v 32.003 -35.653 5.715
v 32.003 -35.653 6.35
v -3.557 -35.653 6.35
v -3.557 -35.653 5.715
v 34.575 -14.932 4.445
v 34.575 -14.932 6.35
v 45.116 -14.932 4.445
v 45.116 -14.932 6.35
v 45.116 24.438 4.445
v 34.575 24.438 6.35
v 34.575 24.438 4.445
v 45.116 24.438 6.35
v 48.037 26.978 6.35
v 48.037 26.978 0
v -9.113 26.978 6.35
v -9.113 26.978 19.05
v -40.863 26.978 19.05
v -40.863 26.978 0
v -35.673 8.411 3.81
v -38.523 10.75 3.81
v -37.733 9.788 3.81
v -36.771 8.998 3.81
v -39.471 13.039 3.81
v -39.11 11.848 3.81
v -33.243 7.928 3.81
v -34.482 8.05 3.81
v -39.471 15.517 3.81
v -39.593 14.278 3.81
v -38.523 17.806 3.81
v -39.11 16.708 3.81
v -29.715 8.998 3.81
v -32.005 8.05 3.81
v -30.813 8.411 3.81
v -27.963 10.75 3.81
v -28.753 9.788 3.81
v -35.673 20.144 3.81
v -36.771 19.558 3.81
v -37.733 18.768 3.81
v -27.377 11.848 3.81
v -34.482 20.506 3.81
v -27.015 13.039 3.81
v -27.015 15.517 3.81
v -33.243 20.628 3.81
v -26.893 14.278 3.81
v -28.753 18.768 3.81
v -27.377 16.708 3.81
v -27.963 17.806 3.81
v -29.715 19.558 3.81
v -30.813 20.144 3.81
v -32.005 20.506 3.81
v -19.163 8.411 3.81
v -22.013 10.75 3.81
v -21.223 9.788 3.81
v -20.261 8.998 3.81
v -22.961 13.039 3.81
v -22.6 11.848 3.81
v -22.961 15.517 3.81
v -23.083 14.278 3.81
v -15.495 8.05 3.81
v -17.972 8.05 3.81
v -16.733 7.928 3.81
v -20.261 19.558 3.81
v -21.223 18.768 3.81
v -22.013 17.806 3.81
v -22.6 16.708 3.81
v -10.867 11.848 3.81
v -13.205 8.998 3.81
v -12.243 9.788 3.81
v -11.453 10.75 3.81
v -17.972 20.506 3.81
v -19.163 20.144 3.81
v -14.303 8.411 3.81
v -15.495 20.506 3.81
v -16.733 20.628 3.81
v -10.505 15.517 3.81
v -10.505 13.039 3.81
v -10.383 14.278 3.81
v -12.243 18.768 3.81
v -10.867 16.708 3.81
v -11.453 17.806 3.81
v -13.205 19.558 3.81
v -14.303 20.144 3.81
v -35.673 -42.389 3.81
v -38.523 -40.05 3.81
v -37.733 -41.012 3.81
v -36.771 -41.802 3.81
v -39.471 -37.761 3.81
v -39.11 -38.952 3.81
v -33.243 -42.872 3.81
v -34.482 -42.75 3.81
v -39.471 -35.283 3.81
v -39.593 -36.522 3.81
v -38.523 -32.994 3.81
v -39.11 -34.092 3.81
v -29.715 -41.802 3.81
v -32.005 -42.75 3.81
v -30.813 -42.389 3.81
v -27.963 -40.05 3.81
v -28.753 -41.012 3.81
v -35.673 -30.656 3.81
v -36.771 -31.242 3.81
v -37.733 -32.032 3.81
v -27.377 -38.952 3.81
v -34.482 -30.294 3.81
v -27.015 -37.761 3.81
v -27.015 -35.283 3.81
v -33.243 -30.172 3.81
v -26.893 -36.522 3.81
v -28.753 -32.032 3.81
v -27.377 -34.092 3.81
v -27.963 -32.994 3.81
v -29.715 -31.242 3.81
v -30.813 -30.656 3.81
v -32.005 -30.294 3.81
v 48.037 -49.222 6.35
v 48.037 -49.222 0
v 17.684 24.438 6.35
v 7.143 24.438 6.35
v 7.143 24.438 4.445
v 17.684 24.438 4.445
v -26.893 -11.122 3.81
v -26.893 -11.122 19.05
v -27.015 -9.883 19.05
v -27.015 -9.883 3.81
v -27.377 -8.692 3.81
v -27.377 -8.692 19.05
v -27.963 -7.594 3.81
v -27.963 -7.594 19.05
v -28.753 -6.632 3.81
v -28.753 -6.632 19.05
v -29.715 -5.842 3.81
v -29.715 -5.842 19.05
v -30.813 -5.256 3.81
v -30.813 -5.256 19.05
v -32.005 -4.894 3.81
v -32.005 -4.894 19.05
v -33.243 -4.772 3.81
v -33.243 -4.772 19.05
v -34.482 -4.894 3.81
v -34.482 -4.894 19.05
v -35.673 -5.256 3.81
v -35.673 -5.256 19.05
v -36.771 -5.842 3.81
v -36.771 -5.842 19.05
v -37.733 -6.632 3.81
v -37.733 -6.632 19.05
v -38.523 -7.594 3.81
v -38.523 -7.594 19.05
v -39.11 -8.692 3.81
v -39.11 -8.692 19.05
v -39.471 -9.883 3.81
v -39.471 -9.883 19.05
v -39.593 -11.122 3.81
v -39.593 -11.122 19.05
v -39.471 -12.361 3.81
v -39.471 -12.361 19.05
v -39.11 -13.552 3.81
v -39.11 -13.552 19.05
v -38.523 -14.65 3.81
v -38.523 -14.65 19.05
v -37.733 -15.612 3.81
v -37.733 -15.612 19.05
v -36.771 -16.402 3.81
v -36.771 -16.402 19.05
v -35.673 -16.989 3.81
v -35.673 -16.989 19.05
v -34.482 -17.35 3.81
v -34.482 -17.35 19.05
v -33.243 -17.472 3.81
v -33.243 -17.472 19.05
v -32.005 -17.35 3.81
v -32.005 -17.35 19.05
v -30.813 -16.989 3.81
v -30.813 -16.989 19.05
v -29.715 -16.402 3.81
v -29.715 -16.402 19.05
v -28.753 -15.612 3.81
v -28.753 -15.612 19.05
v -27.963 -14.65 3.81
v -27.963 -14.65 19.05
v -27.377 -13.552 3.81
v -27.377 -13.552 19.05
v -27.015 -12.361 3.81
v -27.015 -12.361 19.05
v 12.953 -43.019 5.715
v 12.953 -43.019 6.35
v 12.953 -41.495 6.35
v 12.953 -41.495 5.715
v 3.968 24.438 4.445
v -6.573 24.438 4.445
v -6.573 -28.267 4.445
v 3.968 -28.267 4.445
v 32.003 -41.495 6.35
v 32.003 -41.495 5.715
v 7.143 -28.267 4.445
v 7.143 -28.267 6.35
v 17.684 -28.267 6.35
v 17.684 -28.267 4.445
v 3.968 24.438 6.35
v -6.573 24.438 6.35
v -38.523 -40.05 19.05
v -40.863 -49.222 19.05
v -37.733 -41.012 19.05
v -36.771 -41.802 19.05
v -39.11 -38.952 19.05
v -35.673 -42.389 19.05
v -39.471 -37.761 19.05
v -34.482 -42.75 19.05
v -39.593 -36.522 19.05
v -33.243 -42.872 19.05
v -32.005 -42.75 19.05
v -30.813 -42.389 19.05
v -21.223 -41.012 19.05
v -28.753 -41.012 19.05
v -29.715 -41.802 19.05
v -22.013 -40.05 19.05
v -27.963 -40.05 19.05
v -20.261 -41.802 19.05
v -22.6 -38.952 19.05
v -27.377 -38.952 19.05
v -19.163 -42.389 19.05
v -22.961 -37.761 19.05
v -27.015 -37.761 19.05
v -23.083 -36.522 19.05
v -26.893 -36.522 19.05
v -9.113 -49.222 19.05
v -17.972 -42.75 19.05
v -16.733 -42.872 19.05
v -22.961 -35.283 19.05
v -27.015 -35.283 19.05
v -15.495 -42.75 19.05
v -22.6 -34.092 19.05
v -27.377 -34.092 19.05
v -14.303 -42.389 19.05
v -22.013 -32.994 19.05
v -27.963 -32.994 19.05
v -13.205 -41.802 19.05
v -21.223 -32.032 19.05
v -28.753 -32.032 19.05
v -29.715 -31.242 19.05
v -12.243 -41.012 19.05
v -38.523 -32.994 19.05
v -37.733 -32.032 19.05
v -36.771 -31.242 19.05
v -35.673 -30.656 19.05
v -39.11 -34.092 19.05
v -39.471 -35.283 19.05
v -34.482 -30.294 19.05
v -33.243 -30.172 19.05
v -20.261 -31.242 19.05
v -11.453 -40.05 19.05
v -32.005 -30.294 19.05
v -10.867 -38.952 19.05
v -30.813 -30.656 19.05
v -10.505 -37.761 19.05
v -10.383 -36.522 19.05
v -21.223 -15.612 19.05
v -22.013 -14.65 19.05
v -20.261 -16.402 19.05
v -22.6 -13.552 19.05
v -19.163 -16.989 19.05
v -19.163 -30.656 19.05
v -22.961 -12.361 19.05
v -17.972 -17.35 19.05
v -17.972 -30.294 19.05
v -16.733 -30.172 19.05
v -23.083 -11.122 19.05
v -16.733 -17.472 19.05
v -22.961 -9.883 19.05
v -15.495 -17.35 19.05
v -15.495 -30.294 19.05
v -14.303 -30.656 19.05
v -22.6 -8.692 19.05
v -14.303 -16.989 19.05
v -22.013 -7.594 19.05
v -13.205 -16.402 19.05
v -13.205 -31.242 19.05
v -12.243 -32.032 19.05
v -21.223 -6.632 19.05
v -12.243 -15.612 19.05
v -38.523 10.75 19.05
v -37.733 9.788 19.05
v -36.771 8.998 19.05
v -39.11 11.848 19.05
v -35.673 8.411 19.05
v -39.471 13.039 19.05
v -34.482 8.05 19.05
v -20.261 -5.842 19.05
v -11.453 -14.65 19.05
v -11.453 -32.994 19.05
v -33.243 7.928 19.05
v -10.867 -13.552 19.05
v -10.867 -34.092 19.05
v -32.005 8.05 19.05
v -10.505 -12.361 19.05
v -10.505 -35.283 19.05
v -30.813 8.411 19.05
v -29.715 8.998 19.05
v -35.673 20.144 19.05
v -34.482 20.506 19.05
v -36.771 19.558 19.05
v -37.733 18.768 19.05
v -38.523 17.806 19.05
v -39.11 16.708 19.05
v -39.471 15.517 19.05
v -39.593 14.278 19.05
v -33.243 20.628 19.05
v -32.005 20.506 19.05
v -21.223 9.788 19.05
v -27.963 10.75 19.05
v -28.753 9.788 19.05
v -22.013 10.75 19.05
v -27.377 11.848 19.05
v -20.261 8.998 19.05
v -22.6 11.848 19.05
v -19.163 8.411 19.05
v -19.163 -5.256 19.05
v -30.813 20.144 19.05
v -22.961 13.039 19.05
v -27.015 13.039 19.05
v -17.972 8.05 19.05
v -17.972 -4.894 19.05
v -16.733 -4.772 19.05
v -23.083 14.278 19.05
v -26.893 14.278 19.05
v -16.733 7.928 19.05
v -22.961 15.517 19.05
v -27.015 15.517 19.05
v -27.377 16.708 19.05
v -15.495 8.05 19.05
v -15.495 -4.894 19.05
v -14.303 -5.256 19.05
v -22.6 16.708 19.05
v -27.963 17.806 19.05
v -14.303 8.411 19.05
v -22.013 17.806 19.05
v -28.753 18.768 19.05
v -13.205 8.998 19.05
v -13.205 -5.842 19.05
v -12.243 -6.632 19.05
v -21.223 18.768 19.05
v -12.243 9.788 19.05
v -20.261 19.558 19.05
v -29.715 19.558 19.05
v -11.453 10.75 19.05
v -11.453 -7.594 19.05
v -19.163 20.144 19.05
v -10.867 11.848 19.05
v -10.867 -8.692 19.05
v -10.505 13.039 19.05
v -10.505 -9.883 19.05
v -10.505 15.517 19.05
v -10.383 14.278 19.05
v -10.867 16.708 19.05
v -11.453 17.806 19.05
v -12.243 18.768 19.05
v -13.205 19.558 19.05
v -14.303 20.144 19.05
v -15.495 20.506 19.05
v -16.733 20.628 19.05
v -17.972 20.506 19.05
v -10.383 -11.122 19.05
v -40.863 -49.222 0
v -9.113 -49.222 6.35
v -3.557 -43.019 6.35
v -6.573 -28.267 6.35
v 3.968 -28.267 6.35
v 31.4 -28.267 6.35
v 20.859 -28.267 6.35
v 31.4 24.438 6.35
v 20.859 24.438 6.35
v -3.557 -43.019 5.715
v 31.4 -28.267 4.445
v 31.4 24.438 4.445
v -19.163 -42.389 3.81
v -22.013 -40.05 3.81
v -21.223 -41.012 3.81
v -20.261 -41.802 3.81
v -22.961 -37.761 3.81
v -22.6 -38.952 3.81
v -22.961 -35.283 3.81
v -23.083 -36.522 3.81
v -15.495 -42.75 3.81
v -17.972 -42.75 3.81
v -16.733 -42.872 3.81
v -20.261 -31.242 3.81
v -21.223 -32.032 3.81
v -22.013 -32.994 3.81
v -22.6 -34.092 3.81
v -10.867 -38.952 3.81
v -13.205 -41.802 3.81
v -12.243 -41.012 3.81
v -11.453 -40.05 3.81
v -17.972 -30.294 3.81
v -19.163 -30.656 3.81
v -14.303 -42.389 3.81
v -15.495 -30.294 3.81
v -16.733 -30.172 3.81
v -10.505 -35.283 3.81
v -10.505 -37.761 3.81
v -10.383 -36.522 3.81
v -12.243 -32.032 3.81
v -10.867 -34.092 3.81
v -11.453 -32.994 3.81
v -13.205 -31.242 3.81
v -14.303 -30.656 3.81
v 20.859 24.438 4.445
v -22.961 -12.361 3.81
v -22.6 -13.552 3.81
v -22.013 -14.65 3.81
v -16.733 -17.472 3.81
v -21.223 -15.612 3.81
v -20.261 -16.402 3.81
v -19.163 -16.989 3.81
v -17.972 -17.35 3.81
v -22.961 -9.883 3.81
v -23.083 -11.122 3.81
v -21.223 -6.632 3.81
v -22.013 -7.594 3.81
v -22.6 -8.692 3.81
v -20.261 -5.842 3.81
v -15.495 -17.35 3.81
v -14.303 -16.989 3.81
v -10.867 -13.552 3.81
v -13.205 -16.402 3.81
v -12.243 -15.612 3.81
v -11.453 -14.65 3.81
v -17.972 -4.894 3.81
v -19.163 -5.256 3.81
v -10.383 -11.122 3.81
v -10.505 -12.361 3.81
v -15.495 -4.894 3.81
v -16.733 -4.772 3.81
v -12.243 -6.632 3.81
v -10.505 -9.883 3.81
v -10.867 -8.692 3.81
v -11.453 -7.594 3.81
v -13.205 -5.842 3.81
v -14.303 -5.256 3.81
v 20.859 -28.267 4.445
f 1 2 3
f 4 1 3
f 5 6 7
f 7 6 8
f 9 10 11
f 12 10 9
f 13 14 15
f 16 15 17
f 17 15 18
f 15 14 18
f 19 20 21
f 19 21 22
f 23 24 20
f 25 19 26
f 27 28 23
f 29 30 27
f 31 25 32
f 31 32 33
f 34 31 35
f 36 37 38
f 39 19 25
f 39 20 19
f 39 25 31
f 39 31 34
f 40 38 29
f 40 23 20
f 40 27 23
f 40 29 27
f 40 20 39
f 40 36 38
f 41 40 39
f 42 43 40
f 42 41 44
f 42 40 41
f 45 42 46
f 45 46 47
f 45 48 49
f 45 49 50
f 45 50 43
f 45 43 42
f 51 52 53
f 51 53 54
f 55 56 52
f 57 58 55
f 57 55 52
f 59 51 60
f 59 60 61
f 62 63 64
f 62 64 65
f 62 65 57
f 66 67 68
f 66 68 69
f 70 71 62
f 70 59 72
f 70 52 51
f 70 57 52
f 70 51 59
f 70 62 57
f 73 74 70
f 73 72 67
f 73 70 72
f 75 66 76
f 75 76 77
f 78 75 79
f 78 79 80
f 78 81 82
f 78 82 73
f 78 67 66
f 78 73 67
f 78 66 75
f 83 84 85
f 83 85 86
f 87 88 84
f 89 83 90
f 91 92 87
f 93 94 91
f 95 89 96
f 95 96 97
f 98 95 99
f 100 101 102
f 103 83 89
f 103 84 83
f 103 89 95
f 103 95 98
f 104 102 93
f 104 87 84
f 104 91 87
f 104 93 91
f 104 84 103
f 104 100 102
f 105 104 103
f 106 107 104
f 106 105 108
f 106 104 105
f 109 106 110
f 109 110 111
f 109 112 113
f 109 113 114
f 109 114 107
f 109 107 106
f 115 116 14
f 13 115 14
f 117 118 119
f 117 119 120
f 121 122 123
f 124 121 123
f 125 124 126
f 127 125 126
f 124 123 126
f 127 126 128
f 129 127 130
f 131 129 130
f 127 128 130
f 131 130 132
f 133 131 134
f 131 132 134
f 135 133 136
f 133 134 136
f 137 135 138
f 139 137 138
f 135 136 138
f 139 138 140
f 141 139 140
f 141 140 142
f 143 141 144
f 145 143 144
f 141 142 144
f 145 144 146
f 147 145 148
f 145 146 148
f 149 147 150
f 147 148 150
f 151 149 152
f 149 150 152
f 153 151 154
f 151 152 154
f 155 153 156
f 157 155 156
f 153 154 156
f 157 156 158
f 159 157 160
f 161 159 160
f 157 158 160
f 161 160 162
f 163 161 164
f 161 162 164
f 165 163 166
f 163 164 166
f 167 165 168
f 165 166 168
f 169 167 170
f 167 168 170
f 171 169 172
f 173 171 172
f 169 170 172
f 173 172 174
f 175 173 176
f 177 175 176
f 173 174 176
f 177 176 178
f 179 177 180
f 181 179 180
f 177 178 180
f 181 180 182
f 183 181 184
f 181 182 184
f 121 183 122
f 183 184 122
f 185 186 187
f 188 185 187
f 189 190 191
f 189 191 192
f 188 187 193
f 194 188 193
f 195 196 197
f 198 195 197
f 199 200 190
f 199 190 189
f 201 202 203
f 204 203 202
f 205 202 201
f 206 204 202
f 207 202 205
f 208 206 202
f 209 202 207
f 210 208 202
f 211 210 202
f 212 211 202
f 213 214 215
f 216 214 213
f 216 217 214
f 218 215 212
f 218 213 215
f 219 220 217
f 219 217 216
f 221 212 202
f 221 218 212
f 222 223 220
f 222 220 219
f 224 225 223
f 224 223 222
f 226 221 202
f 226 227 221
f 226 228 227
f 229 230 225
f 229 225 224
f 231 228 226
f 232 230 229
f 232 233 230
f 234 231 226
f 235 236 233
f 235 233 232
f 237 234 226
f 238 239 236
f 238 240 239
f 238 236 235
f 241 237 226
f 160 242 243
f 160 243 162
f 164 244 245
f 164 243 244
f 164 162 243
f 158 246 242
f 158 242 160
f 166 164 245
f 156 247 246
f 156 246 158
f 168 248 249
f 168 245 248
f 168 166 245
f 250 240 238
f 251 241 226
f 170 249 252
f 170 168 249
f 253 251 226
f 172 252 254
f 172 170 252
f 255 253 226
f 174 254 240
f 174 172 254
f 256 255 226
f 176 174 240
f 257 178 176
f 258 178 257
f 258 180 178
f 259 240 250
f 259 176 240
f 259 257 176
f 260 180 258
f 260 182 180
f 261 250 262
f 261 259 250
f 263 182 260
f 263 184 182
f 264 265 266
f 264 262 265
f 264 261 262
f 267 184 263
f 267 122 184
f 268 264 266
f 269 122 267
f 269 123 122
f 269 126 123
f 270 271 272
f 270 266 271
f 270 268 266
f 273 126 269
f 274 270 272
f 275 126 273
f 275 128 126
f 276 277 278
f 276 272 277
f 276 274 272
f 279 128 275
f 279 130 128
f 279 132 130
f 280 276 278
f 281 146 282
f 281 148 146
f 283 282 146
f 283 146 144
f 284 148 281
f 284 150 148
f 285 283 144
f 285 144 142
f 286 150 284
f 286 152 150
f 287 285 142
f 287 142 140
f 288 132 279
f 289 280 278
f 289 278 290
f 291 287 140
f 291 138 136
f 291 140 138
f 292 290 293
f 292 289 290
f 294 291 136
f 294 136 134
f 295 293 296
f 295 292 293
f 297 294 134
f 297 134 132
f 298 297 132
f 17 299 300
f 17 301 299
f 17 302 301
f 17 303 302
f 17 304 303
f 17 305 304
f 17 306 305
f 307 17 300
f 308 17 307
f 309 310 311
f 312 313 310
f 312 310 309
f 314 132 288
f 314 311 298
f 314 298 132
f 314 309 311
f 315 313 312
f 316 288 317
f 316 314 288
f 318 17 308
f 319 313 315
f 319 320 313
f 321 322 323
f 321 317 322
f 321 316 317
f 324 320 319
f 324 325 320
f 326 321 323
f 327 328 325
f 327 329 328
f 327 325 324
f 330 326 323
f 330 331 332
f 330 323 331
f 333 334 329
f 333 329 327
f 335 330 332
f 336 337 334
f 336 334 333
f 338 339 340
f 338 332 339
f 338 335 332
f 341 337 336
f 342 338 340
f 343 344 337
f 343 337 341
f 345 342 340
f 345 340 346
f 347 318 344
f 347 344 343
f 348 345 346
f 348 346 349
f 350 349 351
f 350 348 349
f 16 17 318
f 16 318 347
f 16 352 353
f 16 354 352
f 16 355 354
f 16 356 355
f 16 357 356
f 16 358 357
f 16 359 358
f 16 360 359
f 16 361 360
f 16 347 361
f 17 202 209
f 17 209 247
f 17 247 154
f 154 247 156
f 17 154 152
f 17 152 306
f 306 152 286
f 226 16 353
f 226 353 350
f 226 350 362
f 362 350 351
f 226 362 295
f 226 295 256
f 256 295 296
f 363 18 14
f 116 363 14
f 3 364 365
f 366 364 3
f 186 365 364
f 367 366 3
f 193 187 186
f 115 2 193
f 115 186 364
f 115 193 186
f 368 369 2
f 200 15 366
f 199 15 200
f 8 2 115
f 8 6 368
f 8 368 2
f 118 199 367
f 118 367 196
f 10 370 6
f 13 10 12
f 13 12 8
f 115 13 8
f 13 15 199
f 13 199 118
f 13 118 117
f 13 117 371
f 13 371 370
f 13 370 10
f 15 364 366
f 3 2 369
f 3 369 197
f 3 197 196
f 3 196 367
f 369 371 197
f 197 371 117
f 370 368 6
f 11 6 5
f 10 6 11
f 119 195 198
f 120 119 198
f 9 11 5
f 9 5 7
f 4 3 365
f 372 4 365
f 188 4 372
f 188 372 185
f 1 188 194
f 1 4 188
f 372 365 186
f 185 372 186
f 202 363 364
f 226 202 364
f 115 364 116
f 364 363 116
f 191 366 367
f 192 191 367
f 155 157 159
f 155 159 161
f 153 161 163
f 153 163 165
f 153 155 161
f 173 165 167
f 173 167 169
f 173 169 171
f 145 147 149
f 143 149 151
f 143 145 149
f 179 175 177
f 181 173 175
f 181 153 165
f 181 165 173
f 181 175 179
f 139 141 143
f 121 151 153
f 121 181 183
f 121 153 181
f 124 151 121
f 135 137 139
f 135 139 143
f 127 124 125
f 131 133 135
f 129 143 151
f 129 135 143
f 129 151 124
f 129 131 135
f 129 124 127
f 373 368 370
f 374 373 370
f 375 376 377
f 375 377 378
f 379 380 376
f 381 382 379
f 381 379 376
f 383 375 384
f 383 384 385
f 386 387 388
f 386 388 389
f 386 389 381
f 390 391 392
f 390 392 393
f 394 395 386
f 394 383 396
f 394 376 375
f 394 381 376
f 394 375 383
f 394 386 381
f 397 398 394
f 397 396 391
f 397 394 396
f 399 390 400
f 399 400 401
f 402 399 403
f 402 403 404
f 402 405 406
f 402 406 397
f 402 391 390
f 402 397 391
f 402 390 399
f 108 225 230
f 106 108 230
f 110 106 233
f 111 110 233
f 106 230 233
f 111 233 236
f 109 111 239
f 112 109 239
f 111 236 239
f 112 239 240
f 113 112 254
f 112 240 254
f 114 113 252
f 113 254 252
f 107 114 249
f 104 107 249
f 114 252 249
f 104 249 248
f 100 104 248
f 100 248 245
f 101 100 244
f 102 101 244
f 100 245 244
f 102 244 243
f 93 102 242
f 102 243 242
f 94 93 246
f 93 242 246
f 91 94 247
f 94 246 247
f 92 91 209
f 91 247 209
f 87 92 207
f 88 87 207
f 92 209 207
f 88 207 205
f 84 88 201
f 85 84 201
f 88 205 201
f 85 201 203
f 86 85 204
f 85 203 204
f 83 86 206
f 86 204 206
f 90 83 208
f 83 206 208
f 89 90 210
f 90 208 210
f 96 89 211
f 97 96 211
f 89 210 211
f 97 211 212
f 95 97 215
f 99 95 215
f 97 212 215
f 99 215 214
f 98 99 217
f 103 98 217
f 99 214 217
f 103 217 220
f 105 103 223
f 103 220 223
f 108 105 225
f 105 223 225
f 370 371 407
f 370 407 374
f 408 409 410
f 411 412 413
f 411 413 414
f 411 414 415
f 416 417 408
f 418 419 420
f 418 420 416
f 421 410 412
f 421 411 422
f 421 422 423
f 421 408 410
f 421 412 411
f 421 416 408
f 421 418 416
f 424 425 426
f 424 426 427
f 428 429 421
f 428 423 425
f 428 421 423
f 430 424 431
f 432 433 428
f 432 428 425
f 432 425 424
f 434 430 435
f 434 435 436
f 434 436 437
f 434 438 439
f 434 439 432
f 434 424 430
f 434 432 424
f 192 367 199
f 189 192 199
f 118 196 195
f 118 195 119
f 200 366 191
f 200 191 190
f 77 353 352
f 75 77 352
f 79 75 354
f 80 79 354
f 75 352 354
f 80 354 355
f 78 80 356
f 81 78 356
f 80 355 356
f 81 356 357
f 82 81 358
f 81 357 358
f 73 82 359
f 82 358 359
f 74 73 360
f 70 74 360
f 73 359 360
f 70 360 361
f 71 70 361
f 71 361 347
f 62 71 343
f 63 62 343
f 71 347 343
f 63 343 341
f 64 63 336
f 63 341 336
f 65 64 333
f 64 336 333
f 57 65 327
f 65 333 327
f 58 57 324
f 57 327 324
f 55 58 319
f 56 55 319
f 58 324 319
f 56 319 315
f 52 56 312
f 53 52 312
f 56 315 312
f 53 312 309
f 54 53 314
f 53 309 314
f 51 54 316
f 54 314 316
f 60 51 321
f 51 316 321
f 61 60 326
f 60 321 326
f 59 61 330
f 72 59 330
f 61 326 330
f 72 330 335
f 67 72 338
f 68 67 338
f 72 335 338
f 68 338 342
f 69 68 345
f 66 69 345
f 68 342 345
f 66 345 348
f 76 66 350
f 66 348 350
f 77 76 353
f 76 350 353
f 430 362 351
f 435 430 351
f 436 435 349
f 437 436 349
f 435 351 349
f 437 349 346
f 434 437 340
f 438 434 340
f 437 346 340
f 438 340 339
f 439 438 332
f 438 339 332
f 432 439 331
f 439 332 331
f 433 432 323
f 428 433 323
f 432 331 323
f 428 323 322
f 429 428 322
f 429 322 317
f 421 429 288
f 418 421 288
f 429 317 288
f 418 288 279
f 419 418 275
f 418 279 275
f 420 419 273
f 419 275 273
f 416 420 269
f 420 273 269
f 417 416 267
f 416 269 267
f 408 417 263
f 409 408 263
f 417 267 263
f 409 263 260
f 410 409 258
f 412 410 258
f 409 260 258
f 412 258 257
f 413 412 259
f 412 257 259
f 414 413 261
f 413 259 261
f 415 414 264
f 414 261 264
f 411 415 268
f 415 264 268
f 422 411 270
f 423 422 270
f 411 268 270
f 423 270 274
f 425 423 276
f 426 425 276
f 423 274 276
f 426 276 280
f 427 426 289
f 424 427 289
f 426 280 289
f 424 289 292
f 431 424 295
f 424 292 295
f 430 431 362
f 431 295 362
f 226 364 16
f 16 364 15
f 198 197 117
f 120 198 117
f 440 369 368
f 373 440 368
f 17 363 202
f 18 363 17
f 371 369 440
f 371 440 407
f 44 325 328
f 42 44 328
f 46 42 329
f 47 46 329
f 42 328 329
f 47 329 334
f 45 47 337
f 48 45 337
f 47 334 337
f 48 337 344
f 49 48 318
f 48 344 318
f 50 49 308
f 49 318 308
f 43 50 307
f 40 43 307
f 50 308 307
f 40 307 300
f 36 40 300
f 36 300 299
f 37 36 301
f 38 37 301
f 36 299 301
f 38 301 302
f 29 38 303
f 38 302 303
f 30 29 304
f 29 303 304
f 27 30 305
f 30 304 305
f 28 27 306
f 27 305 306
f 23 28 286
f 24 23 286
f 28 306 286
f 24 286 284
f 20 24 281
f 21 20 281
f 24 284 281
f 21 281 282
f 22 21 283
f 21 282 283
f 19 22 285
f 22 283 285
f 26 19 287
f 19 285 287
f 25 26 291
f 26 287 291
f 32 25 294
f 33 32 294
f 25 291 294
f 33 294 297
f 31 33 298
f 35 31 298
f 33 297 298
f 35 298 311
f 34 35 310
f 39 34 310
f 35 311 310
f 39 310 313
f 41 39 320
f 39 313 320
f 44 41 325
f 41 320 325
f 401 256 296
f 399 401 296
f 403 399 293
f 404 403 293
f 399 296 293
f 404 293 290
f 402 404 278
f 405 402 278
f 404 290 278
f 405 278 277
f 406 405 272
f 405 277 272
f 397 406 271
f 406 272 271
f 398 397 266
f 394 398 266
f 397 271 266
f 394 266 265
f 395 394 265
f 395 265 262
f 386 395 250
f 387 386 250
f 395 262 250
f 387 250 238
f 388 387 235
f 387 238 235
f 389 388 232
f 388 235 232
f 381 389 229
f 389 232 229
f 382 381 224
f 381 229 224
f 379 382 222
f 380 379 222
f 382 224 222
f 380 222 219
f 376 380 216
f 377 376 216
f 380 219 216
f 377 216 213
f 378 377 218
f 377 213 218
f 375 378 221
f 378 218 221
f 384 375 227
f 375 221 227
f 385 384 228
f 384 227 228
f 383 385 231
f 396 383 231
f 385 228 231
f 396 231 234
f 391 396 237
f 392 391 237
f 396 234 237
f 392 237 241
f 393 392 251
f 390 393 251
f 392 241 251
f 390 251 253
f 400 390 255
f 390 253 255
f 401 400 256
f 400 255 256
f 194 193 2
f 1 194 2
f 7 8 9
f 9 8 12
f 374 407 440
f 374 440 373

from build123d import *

# Parameters (mm, degrees)
F0_W     = 31.75
F0_H     = 76.2
F1_DEPTH = 19.05
F0_W_2   = 57.15
F2_DEPTH = 6.35
F3_R     = 6.35
F4_DEPTH = 15.24
F5_W     = 10.541
F5_H     = 52.705
F5_H_2   = 39.37
F6_DEPTH = 1.905
F7_DEPTH = 1.27


with BuildPart() as f1:
    # F0 (on Top) → F1 (new body)
    with BuildSketch(Plane.XY):
        with Locations((-24.9883290738, -11.122222997)):
            Rectangle(F0_W, F0_H)
    extrude(amount=F1_DEPTH)

    # F0 (on Top) → F2 (join)
    with BuildSketch(Plane.XY):
        with Locations((19.4616709262, -11.122222997)):
            Rectangle(F0_W_2, F0_H)
        with Locations((-24.9883290738, -11.122222997)):
            Rectangle(F0_W, F0_H)
    extrude(amount=F2_DEPTH)

    # F3 (on face) → F4 (cut)
    with BuildSketch(Plane.XY.offset(19.05)):
        with Locations((-33.2433290738, 14.277777003)):
            Circle(F3_R)
        with Locations((-16.7333290738, 14.277777003)):
            Circle(F3_R)
        with Locations((-33.2433290738, -11.122222997)):
            Circle(F3_R)
        with Locations((-16.7333290738, -11.122222997)):
            Circle(F3_R)
        with Locations((-16.7333290738, -36.522222997)):
            Circle(F3_R)
        with Locations((-33.2433290738, -36.522222997)):
            Circle(F3_R)
    extrude(amount=-F4_DEPTH, mode=Mode.SUBTRACT)

    # F5 (on face) → F6 (cut)
    with BuildSketch(Plane.XY.offset(6.35)):
        with Locations((12.4131709262, -1.914722997)):
            Rectangle(F5_W, F5_H)
        with Locations((-1.3028290738, -1.914722997)):
            Rectangle(F5_W, F5_H)
        with Locations((39.8451709262, 4.752777003)):
            Rectangle(F5_W, F5_H_2)
        with Locations((26.1291709262, -1.914722997)):
            Rectangle(F5_W, F5_H)
        Polygon((32.0029154061, -35.6534661021), (-3.5570845939, -35.6534661021), (-3.5570845939, -43.0194661021), (12.9529154061, -43.0194661021), (12.9529154061, -41.4954661021), (32.0029154061, -41.4954661021), align=None)
    extrude(amount=-F6_DEPTH, mode=Mode.SUBTRACT)

    # F7 (add): a face of the model
    f7_faces = [f1.faces().sort_by_distance(p)[0] for p in [
        (13.1938987856, -38.9723525287, 4.445),
    ]]
    extrude(f7_faces, amount=F7_DEPTH)


solid = f1.part
